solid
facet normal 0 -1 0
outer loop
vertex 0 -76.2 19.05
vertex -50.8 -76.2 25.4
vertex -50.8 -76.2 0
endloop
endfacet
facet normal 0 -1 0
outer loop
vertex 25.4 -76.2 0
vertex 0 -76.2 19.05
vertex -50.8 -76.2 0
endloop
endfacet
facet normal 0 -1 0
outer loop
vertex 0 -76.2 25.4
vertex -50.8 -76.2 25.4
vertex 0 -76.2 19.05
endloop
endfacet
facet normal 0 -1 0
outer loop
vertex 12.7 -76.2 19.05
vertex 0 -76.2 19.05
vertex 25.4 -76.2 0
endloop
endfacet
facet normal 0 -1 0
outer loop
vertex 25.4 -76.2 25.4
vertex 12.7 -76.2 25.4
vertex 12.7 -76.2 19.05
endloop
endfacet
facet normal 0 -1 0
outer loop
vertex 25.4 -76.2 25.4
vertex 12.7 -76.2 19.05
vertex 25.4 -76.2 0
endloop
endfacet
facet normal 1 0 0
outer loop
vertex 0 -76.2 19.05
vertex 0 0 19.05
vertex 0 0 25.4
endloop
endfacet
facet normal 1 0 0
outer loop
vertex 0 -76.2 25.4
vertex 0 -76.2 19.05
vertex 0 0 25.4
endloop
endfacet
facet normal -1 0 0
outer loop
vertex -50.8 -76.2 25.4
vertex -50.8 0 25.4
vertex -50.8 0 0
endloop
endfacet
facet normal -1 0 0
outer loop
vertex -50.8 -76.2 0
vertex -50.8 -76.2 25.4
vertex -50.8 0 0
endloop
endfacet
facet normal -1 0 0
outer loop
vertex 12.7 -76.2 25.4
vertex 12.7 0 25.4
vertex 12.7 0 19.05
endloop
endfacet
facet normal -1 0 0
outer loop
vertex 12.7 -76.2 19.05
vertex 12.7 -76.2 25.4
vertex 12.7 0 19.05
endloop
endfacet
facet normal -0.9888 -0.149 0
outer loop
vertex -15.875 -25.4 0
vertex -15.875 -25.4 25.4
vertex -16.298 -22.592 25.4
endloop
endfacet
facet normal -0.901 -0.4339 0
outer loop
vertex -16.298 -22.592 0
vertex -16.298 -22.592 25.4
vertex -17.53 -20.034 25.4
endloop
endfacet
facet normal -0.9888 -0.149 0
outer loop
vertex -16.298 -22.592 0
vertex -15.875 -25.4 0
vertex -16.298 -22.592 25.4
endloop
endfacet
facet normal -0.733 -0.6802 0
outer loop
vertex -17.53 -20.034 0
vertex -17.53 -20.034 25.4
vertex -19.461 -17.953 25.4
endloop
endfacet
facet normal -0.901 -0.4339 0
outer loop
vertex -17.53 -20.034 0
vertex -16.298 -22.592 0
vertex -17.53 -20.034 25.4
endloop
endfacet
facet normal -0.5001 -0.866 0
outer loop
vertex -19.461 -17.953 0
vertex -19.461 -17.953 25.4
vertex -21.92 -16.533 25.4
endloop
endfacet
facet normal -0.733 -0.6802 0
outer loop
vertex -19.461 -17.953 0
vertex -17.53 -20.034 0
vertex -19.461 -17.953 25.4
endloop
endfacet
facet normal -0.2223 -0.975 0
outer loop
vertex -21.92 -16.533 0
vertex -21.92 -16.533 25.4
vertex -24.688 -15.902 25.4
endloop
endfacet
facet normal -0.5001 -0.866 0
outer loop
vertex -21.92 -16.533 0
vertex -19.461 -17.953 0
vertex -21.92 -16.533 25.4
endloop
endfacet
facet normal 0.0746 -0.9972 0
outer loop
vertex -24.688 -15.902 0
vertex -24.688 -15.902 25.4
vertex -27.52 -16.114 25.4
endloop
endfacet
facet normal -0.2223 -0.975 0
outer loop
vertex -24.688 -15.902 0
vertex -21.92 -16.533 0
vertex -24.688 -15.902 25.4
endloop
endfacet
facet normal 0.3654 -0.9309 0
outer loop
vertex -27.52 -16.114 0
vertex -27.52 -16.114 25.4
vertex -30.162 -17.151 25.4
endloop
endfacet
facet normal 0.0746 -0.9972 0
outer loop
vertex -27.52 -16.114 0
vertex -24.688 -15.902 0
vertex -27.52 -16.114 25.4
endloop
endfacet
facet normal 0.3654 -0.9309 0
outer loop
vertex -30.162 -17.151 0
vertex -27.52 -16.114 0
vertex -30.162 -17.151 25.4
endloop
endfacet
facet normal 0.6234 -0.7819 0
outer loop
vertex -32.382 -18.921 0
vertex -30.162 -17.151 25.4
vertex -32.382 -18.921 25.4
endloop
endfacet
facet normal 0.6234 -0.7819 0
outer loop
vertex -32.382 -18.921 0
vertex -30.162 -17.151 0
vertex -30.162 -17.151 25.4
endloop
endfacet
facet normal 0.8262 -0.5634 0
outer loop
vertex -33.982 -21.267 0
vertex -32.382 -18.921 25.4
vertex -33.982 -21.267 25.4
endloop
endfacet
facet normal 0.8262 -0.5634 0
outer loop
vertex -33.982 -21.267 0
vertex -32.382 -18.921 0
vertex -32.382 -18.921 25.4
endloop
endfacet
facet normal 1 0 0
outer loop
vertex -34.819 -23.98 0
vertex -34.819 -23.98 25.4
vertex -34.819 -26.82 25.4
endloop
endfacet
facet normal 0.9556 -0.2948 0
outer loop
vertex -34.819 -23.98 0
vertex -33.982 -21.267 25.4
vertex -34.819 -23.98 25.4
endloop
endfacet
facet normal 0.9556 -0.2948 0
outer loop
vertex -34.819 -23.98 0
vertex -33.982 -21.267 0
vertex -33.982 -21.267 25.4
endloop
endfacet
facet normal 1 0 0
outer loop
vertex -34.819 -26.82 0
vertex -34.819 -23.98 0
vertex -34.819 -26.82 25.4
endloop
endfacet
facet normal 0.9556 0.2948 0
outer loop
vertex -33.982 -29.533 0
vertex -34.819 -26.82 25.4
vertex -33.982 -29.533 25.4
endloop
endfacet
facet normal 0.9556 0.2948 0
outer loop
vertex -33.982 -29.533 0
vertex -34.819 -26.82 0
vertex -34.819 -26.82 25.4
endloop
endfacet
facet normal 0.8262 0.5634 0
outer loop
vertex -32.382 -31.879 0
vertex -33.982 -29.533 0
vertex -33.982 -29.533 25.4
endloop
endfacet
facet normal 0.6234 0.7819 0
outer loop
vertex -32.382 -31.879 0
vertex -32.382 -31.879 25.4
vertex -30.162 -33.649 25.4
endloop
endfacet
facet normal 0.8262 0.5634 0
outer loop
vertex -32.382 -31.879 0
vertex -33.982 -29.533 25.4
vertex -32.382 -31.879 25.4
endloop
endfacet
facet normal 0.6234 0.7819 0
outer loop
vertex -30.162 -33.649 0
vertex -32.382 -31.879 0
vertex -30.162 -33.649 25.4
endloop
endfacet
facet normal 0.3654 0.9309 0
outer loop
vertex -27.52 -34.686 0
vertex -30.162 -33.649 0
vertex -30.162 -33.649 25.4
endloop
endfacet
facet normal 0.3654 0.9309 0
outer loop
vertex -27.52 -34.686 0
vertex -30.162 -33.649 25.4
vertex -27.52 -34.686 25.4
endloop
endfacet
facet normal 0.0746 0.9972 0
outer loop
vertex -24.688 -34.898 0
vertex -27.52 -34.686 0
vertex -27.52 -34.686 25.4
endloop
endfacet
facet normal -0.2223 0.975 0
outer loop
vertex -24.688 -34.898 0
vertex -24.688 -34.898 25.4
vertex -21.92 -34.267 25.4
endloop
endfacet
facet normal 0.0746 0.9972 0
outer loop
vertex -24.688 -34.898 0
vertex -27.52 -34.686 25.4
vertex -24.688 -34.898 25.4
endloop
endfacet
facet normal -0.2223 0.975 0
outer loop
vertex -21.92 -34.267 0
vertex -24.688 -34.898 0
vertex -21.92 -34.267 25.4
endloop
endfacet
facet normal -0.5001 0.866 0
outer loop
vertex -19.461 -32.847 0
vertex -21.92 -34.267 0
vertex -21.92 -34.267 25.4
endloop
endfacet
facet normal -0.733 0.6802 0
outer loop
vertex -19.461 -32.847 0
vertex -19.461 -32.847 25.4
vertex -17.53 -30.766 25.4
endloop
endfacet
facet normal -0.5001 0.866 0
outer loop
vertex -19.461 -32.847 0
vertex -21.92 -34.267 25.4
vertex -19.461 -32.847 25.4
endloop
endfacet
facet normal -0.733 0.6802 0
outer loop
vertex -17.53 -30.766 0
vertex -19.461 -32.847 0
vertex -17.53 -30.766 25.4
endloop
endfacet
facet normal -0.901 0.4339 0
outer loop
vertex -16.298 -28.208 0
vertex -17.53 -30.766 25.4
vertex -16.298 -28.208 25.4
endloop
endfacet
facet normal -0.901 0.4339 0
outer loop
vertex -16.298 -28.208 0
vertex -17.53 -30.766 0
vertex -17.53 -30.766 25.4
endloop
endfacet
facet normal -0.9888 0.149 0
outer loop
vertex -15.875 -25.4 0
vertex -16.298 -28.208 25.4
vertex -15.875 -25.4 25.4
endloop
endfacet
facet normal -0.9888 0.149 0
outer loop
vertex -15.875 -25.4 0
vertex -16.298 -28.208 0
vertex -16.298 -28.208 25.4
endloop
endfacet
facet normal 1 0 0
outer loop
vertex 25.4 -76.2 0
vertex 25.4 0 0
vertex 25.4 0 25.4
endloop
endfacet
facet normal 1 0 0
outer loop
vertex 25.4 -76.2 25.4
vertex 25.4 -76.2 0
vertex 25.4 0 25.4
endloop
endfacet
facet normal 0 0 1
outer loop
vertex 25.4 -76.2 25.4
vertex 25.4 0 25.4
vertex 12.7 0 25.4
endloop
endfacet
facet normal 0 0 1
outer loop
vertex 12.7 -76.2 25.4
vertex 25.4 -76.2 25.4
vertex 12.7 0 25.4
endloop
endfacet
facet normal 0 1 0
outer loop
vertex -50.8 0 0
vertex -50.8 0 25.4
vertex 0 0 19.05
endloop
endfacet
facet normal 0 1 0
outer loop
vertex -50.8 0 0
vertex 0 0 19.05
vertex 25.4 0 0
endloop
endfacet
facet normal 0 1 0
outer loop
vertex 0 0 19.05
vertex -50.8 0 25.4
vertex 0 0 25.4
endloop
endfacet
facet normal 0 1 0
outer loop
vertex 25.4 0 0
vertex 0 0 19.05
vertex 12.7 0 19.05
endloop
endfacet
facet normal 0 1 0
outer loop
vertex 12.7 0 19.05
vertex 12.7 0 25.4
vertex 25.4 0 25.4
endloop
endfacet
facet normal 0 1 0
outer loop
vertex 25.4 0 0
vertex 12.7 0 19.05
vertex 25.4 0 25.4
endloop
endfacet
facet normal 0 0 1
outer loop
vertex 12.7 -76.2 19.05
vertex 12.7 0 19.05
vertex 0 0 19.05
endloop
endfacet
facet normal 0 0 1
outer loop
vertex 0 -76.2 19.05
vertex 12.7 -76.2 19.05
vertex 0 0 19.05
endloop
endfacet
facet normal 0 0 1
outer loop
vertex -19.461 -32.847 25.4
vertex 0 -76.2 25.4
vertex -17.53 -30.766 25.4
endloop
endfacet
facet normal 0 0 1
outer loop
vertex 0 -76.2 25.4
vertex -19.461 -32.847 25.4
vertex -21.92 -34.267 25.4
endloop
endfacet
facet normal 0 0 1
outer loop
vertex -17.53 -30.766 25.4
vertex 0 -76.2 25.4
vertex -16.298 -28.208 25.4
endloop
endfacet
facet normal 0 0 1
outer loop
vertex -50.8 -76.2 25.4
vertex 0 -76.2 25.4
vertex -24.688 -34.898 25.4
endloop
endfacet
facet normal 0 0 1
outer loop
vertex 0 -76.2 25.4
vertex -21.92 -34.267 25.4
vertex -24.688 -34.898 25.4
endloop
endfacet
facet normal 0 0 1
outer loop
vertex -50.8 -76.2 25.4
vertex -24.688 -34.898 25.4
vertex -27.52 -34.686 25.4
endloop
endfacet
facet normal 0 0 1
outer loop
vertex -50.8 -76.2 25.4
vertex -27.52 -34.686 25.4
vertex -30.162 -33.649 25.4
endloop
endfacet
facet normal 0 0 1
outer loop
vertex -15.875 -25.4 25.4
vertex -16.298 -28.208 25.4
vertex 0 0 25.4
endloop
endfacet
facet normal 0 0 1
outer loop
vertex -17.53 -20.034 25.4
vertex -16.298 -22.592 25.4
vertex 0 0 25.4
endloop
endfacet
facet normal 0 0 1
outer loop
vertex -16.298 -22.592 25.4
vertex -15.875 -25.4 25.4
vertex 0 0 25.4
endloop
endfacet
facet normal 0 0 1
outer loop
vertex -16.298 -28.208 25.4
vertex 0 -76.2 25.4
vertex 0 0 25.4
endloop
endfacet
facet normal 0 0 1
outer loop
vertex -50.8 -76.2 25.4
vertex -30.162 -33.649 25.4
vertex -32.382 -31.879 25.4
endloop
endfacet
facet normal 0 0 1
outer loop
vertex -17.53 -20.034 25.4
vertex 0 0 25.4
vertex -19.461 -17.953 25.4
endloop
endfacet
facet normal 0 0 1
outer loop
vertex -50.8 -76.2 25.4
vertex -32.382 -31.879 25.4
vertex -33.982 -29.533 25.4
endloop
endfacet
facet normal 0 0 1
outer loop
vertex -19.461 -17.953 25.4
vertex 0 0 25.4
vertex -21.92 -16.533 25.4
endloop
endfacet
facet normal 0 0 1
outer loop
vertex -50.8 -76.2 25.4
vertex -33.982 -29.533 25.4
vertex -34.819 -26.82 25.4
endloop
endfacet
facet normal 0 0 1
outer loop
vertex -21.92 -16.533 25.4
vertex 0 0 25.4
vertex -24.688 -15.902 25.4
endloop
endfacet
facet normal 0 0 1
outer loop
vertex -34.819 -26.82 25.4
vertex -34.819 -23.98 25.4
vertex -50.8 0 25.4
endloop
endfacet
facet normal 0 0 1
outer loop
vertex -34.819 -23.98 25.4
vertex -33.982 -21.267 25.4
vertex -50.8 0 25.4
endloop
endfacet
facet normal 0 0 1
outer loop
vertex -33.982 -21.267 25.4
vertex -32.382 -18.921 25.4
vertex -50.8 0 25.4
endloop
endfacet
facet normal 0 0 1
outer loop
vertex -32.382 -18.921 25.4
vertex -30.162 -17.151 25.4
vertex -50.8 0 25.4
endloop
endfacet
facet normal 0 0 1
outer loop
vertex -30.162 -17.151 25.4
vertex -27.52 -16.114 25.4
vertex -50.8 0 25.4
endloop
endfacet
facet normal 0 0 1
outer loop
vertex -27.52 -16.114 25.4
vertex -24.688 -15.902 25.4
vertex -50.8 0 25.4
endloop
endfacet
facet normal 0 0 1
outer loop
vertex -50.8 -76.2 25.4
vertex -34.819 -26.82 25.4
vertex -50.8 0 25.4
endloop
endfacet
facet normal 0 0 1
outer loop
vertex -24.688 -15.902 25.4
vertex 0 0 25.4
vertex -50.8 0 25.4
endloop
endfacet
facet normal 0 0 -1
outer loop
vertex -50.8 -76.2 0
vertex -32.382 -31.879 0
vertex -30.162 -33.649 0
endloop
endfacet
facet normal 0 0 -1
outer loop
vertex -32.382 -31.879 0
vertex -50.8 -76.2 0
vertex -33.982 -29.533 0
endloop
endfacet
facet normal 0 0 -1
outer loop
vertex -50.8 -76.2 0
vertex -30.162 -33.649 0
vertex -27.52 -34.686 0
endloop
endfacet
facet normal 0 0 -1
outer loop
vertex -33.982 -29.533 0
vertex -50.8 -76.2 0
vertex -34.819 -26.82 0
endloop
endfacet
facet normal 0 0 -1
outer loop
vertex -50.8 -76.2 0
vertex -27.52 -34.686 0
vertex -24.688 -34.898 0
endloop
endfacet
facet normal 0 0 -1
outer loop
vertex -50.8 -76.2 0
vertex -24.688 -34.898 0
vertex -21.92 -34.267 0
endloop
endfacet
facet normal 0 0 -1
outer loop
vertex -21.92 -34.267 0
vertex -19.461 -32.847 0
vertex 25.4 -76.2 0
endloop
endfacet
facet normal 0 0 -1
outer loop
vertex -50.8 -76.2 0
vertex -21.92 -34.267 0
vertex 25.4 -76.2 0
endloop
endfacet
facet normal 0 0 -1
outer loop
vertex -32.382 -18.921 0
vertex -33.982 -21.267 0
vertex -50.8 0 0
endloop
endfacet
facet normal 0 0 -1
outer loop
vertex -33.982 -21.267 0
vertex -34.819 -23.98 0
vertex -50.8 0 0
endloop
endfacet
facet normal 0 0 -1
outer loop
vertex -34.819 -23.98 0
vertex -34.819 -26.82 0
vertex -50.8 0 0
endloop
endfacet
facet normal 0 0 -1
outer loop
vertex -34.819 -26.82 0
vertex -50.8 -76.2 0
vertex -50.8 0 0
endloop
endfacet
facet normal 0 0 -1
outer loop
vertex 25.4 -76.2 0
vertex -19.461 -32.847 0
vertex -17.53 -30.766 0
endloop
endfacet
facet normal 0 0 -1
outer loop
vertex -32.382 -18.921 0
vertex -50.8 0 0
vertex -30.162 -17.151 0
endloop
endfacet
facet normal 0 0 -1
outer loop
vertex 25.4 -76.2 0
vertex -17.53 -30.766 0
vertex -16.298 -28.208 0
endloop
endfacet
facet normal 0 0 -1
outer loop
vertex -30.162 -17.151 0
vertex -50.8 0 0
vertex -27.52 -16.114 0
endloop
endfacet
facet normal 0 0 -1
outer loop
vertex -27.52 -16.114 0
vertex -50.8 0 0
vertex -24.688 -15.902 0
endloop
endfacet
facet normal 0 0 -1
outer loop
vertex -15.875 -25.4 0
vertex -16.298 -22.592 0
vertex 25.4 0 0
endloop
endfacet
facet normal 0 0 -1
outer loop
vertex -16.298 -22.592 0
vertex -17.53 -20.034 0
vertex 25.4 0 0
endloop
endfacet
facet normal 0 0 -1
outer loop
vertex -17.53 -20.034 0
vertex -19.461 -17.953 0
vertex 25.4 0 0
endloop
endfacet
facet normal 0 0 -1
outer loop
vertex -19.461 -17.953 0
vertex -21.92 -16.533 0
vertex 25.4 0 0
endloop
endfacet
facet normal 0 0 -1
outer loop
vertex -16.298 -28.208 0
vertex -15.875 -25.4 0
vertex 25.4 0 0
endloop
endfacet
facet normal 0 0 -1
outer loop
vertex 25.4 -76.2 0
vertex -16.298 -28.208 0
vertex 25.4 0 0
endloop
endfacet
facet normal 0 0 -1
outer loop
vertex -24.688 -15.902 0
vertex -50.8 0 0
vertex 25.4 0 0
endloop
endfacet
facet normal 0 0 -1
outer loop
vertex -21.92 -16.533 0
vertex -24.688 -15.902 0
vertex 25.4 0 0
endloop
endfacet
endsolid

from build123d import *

# Parameters (mm, degrees)
F1_DEPTH = 76.2
F2_R     = 9.525
F3_DEPTH = 76.2


with BuildPart() as f1:
    # F0 (on Front) → F1 (new body)
    with BuildSketch(Plane.XZ):
        Polygon((-50.8, 0), (25.4, 0), (25.4, 25.4), (12.7, 25.4), (12.7, 19.05), (0, 19.05), (0, 25.4), (-50.8, 25.4), align=None)
    extrude(amount=F1_DEPTH)

    # F2 (on Top) → F3 (cut)
    with BuildSketch(Plane.XY):
        with Locations((-25.4, -25.4)):
            Circle(F2_R)
    extrude(amount=F3_DEPTH, mode=Mode.SUBTRACT)


solid = f1.part
